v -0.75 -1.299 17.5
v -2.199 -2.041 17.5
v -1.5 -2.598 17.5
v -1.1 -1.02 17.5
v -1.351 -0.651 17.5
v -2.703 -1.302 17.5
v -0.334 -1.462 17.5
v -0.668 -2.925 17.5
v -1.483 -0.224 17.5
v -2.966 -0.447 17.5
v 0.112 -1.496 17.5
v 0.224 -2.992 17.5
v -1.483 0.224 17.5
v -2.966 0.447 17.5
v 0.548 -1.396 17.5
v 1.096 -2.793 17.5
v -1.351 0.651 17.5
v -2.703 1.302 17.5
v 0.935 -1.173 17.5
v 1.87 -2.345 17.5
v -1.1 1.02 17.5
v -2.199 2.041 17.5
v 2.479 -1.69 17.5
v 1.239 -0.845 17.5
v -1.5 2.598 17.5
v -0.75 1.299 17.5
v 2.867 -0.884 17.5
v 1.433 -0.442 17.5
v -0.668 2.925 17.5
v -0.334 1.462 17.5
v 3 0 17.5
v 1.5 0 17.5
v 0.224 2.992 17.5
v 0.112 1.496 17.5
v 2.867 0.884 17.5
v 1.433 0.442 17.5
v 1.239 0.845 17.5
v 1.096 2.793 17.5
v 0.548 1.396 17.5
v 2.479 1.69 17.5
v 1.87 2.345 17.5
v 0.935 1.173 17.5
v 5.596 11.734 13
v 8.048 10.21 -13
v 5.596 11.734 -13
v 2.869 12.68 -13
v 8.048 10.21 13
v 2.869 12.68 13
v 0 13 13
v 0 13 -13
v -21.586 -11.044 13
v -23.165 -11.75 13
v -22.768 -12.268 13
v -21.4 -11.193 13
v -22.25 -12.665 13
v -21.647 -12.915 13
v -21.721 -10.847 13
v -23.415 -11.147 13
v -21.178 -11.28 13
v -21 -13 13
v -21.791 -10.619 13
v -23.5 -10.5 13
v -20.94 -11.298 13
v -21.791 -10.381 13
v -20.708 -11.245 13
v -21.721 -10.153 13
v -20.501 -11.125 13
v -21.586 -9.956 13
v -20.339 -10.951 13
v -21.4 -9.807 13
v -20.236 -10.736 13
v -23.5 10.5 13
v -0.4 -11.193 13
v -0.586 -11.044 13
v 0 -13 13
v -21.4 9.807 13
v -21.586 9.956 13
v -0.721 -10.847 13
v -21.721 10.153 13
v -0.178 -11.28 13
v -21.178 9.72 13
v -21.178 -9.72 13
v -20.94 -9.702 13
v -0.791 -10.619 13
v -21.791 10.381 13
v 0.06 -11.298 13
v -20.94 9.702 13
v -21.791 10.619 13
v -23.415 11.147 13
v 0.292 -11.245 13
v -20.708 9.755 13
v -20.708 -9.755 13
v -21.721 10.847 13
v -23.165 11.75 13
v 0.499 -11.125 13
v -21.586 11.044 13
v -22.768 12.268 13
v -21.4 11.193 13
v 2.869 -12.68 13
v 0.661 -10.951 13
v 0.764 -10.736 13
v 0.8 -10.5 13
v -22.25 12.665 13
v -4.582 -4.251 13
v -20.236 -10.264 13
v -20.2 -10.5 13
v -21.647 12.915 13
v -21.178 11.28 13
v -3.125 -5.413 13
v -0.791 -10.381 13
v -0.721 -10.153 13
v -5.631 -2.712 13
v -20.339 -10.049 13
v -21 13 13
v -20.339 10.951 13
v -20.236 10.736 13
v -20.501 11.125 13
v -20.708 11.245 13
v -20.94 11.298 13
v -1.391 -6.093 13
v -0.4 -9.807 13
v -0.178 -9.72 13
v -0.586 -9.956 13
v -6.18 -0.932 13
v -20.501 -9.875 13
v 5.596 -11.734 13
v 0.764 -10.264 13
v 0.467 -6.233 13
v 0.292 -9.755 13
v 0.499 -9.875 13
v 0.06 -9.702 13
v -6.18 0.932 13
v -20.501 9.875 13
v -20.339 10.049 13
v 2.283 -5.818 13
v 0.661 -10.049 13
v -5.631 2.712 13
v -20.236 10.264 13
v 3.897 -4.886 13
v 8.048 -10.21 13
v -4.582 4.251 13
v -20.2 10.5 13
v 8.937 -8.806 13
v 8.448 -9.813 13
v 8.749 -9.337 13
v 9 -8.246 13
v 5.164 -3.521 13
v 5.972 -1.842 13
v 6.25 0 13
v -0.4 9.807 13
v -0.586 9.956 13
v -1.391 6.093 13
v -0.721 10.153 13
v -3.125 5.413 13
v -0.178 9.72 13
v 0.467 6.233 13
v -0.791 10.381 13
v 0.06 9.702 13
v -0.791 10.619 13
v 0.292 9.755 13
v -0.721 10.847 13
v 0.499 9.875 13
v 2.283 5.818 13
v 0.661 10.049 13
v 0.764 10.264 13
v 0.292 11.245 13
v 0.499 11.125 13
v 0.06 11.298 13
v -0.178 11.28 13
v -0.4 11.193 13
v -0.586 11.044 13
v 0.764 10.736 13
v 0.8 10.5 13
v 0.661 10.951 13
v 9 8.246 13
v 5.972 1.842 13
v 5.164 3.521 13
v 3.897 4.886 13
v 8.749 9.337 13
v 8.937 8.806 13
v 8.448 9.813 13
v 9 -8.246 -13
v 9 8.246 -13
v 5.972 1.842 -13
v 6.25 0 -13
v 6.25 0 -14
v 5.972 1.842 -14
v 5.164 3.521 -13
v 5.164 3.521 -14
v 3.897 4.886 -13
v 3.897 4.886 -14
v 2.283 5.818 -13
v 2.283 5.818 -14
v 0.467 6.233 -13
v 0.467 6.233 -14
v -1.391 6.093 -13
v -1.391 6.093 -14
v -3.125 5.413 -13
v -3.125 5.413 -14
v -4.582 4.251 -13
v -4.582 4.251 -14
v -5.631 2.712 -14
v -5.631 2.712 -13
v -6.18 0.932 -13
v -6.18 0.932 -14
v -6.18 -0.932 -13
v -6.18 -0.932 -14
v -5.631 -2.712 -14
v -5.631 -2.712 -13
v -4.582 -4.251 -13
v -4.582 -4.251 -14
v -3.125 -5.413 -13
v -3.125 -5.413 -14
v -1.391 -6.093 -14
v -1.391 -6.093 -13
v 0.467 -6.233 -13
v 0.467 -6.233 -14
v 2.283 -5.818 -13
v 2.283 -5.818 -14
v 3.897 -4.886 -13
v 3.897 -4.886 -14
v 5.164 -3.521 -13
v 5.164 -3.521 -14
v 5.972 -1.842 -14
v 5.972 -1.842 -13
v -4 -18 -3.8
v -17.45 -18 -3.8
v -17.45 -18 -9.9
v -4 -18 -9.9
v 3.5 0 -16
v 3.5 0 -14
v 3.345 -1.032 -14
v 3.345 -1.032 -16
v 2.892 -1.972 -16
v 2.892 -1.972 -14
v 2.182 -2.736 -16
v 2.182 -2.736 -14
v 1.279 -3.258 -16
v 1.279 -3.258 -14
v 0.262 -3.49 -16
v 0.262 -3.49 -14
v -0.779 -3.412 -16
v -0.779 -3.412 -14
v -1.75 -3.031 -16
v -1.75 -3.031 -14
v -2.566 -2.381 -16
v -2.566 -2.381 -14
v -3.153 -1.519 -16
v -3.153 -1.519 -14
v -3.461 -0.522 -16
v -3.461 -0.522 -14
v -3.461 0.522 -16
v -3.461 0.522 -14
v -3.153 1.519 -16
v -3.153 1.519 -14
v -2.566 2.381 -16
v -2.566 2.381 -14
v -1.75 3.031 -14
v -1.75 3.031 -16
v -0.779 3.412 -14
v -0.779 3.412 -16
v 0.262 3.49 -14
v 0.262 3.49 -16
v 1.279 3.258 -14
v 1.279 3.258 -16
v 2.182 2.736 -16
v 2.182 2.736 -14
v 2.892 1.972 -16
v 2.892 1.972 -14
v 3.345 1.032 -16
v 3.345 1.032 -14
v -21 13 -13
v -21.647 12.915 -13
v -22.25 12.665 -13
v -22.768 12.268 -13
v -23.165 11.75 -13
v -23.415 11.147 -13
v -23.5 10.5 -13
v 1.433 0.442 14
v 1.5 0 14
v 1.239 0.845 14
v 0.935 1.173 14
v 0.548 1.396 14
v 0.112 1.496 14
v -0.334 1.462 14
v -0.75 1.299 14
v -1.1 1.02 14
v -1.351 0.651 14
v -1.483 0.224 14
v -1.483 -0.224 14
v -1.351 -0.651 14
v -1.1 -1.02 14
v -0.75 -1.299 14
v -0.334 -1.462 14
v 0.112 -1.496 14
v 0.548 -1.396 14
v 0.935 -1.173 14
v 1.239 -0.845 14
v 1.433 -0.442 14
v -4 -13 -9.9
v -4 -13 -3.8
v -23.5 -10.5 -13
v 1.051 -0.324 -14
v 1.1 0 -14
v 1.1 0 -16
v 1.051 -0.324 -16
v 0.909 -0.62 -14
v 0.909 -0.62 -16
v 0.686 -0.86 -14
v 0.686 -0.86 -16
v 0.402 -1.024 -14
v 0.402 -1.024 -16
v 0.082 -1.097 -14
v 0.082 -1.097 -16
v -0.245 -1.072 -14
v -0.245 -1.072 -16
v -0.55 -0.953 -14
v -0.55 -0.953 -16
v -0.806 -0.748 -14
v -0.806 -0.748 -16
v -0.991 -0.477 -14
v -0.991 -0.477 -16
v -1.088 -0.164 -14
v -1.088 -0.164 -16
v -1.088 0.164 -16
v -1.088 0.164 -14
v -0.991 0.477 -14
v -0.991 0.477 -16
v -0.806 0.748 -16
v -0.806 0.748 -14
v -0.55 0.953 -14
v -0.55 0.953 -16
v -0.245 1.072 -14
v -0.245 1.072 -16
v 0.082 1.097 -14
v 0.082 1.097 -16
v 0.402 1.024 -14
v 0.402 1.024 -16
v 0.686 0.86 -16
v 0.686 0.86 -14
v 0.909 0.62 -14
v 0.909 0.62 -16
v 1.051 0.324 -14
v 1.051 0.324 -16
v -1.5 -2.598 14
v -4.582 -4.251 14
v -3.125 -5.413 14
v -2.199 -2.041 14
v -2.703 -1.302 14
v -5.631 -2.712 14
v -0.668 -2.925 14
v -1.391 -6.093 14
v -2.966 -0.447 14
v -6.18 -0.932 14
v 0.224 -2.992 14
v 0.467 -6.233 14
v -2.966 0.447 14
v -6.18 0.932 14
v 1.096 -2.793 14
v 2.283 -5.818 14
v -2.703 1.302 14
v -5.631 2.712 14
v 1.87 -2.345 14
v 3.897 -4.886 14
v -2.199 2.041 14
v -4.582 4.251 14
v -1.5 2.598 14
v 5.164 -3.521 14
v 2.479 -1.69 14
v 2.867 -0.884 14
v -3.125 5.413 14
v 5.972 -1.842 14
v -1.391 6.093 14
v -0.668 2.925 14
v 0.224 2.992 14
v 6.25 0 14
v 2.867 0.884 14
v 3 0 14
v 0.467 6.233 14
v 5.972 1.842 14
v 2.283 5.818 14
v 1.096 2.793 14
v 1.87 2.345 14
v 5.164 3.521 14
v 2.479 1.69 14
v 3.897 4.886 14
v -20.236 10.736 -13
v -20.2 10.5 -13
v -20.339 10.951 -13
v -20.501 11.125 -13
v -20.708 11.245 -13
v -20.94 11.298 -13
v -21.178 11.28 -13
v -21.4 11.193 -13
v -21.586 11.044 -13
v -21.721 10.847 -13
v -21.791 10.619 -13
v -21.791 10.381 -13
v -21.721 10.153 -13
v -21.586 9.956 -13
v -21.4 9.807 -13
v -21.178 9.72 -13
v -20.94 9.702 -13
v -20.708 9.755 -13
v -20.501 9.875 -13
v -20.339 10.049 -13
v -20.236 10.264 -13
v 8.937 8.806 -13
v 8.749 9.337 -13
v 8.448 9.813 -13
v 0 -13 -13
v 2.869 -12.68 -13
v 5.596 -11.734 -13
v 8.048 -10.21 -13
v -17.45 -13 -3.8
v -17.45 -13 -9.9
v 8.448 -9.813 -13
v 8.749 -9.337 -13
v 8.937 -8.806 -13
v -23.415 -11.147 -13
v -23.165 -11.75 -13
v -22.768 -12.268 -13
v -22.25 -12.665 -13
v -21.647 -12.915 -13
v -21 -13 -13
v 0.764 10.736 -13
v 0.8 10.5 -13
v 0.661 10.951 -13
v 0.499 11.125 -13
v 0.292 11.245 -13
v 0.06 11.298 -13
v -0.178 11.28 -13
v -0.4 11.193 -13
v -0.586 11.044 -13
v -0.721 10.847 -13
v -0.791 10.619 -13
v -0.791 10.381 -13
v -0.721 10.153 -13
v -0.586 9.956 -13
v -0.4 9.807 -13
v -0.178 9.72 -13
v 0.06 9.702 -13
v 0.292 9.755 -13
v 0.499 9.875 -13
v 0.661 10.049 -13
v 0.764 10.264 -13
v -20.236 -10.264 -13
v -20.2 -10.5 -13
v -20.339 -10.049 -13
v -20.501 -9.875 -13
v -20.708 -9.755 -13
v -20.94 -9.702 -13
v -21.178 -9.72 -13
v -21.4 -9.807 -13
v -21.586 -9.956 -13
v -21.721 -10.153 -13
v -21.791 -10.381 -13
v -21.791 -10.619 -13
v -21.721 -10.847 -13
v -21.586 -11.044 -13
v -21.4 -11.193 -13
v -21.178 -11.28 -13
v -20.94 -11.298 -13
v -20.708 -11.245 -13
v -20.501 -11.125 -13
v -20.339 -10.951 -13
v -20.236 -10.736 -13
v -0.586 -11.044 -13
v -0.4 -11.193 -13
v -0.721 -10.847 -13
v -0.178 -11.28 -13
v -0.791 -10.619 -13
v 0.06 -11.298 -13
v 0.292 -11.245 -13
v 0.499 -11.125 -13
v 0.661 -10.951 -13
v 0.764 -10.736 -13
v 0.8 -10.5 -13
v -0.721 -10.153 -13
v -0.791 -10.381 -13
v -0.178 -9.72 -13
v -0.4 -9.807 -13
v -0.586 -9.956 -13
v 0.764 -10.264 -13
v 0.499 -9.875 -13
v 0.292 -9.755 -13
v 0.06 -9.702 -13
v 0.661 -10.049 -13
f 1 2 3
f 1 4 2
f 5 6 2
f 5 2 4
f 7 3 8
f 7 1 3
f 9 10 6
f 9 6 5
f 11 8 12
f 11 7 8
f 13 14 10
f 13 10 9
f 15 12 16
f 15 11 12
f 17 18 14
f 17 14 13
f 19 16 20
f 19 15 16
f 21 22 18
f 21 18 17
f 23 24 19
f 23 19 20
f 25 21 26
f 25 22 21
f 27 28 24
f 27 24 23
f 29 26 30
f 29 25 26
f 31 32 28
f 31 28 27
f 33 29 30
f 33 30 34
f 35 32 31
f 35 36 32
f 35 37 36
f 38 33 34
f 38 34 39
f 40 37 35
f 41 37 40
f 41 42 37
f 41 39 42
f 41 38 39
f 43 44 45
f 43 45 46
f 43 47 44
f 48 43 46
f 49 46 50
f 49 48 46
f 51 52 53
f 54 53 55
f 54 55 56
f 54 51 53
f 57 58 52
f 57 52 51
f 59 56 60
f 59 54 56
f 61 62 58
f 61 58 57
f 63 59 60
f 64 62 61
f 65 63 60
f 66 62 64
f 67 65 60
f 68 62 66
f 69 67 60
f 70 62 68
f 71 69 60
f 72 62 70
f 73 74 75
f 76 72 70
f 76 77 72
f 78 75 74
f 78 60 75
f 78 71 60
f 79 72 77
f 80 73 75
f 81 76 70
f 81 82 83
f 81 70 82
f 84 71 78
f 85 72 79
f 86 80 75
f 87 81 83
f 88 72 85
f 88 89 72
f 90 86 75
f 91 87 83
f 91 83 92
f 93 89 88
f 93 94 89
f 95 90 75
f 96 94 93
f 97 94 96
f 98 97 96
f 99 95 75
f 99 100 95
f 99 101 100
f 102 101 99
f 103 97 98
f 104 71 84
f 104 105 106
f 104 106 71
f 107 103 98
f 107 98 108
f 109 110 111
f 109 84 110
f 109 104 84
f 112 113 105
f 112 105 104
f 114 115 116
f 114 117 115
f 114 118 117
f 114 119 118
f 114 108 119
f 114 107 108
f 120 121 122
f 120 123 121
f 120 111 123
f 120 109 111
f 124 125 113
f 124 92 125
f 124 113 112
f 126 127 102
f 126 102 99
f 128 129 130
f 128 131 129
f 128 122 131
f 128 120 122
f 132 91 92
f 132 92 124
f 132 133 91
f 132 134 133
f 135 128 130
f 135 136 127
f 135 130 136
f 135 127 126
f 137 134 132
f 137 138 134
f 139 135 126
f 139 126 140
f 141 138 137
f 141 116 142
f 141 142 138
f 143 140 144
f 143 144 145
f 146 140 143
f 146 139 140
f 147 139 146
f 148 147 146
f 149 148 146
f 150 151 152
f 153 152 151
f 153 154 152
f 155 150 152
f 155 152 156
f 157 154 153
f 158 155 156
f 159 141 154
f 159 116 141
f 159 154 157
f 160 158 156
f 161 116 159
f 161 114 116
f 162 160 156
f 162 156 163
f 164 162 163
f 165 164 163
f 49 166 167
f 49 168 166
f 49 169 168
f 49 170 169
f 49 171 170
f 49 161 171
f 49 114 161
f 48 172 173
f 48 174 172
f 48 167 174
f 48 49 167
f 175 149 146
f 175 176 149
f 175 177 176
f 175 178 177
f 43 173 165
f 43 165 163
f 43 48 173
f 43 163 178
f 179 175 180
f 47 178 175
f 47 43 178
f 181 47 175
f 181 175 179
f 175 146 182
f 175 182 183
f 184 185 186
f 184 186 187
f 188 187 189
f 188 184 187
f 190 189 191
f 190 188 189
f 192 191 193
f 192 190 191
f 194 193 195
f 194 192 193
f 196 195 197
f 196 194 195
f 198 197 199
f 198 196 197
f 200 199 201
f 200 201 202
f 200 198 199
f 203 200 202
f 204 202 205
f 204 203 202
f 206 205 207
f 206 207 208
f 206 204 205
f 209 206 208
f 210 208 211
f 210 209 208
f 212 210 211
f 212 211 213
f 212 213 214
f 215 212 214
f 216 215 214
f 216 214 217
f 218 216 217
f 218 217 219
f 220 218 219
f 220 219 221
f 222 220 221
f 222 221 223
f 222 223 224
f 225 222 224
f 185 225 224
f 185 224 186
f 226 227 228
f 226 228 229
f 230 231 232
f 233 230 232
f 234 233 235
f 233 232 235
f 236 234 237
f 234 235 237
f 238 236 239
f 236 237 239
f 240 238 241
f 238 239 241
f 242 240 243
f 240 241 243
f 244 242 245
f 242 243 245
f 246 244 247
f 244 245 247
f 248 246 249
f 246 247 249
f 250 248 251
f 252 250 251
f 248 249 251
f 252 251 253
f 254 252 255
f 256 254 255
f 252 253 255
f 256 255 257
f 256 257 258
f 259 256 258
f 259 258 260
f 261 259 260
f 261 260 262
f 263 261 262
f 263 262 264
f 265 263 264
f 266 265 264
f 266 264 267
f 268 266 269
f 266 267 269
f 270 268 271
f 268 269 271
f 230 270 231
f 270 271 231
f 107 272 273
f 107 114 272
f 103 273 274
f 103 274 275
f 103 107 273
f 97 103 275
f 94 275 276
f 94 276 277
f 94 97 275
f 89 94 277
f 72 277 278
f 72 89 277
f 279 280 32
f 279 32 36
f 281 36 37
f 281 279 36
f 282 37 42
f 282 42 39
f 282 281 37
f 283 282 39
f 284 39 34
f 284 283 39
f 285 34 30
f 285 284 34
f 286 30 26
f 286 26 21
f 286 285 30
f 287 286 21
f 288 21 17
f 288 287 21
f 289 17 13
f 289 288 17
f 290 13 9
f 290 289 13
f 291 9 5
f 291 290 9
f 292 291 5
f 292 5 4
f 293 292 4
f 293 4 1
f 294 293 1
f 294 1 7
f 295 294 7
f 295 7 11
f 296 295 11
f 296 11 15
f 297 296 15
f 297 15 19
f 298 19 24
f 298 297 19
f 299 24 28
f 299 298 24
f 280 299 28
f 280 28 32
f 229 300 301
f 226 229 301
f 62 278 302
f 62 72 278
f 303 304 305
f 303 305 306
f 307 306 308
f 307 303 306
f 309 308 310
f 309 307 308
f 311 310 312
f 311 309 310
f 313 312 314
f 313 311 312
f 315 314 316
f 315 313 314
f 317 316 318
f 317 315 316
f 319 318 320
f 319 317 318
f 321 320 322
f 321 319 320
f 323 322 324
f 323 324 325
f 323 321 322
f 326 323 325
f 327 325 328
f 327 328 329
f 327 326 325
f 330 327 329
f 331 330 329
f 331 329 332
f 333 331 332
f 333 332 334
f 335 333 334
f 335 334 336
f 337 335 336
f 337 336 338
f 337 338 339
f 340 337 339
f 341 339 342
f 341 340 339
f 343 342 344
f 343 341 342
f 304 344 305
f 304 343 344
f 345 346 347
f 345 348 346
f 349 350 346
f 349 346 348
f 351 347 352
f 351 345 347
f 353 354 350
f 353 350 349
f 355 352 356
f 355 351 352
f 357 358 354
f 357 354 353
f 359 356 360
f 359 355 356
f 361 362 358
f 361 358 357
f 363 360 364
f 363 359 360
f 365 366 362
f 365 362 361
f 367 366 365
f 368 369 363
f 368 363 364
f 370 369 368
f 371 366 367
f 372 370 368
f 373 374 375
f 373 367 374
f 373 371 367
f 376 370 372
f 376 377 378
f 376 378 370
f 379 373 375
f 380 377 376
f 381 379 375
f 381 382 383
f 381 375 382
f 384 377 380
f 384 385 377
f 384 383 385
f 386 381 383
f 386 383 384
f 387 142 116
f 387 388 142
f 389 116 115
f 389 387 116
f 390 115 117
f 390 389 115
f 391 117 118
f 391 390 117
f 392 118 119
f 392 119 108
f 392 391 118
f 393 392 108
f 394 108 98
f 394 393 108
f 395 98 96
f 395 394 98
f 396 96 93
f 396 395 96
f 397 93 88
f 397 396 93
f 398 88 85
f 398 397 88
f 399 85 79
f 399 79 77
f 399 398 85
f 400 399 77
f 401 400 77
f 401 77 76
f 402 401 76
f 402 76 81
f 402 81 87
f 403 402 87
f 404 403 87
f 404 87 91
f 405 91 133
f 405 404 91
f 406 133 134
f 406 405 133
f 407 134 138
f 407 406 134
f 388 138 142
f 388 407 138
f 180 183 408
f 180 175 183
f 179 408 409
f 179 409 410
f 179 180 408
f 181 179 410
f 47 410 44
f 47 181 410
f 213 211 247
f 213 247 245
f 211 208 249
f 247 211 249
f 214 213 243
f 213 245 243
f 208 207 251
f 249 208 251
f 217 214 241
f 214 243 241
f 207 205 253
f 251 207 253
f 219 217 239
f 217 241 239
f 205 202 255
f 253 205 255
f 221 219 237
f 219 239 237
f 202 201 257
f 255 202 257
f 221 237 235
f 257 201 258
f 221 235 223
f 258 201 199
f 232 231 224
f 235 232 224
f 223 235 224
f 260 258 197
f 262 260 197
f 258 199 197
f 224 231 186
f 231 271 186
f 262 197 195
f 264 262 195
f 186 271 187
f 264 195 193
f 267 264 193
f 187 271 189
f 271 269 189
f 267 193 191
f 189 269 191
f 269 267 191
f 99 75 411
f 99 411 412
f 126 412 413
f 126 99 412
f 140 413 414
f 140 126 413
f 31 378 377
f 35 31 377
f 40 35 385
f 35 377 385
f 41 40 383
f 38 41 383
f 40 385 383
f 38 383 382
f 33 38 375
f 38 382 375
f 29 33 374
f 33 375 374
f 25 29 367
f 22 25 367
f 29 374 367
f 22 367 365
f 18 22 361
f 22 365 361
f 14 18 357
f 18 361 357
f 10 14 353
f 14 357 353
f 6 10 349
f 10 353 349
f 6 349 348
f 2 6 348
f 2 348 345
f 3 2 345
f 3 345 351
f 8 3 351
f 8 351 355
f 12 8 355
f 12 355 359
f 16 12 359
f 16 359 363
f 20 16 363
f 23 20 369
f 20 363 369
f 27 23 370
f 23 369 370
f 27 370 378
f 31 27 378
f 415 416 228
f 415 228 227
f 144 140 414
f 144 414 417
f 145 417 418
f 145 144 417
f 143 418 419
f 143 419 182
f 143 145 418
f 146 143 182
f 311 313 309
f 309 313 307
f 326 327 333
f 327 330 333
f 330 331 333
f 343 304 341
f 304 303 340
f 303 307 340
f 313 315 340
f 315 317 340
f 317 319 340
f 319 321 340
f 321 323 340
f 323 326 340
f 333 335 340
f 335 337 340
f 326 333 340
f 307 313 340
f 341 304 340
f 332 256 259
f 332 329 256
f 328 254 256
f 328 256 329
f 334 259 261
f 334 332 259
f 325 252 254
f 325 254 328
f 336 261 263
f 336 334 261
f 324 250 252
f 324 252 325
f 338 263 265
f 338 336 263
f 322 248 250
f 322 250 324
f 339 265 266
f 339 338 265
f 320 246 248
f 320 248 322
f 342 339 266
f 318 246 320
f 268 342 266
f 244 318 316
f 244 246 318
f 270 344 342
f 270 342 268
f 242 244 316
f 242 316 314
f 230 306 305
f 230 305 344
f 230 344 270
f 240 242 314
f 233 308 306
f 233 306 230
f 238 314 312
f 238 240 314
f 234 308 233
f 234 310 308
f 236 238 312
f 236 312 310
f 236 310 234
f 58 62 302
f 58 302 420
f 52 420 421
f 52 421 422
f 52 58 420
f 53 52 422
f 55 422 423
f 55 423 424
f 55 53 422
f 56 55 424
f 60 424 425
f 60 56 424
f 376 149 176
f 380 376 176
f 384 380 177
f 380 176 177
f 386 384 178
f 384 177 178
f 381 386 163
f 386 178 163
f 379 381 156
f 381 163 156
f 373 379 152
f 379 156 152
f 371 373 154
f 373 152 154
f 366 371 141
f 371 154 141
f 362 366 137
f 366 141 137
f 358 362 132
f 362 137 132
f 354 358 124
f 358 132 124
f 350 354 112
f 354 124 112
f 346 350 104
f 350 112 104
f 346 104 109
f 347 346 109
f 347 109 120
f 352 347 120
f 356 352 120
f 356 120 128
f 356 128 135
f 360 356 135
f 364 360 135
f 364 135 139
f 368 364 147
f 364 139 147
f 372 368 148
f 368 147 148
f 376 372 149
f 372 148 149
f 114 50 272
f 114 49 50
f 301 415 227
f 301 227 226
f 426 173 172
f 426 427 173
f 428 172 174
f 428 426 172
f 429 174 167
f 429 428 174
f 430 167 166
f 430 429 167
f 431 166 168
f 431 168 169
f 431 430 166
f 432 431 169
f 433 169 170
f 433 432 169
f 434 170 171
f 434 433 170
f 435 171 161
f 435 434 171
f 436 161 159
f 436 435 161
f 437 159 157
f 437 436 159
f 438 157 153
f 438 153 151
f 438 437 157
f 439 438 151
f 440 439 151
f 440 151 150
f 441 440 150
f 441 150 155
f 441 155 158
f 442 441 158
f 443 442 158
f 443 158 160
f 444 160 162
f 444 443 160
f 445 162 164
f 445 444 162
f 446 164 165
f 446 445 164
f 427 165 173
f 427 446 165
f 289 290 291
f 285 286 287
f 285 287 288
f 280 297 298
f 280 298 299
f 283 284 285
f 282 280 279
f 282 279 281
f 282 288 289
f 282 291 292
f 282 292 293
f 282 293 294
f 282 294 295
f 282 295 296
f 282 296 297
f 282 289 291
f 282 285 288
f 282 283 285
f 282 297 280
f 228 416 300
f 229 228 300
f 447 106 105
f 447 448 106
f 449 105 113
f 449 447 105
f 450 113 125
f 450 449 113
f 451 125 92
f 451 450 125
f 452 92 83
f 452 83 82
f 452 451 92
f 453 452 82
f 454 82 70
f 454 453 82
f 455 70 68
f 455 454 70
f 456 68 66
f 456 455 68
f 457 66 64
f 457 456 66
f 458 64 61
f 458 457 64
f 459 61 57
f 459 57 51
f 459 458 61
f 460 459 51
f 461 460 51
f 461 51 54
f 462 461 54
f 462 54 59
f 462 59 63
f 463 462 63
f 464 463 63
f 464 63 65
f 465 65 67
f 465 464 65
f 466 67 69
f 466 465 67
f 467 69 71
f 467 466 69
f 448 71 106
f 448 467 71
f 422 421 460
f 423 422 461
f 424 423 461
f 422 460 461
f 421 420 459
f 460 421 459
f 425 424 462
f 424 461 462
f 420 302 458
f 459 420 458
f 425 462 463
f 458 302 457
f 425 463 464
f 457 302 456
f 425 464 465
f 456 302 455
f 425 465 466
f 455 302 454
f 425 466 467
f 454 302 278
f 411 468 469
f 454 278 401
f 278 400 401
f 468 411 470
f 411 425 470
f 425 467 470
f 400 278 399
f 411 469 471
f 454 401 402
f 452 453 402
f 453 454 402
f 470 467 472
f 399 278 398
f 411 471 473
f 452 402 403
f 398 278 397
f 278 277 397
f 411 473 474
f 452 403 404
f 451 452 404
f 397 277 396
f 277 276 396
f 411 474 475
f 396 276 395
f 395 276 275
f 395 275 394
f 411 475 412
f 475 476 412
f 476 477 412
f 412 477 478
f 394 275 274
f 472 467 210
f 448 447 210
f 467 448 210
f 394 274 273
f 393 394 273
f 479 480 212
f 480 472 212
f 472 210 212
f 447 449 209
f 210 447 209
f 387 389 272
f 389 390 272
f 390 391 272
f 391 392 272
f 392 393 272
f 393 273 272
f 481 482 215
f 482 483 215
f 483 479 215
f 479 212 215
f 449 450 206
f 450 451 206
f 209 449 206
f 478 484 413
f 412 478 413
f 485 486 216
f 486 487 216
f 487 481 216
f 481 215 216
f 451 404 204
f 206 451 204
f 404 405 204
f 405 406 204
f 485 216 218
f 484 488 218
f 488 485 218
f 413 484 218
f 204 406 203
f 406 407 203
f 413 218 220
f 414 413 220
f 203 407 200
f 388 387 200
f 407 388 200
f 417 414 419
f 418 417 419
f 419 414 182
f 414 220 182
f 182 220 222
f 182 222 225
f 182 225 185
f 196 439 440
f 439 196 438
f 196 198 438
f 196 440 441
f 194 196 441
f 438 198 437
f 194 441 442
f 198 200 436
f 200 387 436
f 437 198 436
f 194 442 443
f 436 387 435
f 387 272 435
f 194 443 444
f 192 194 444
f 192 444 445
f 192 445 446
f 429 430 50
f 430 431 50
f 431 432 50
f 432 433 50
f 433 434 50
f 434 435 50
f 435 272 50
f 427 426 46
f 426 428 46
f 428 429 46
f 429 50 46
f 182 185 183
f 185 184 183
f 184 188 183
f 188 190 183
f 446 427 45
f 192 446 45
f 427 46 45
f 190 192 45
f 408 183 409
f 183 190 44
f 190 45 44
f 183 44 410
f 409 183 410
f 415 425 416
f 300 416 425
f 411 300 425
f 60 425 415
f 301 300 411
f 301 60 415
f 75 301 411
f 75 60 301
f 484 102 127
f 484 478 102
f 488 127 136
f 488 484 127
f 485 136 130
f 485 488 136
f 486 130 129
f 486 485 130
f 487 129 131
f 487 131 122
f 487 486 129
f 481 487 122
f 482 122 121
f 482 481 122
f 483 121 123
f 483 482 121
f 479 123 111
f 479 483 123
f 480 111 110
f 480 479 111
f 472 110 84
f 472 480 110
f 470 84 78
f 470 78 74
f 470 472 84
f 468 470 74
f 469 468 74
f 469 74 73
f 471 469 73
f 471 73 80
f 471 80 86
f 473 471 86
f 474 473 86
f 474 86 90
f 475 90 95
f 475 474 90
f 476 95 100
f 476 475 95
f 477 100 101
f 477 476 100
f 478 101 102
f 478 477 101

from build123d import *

# Parameters (mm, degrees)
F0_R          = 0.8
F1_DEPTH      = 13
F2_R          = 6.25
F3_DEPTH      = 1
F3_DEPTH_BACK = 27
F4_R          = 3
F4_R_2        = 1.5
F5_DEPTH      = 3.5
F6_R          = 3.5
F6_R_2        = 1.1
F7_DEPTH      = 2
F8_W          = 13.45
F8_H          = 6.1
F9_DEPTH      = 5


with BuildPart() as f1:
    # F0 (on Top) → F1 (new body, symmetric)
    with BuildSketch(Plane.XY):
        with BuildLine():
            Line((-23.5, 10.5), (-23.5, 0))
            Line((-23.5, 0), (-23.5, -10.5))
            ThreePointArc((-23.5, -10.5), (-22.767767, -12.267767), (-21, -13))
            Line((-21, -13), (0, -13))
            ThreePointArc((0, -13), (4.25883, -12.282604), (8.047619, -10.209595))
            ThreePointArc((8.047619, -10.209595), (8.749339, -9.337301), (9, -8.246211))
            Line((9, -8.246211), (9, 0))
            Line((9, 0), (9, 8.246211))
            ThreePointArc((9, 8.246211), (8.749339, 9.337301), (8.047619, 10.209595))
            ThreePointArc((8.047619, 10.209595), (4.25883, 12.282604), (0, 13))
            Line((0, 13), (-21, 13))
            ThreePointArc((-21, 13), (-22.767767, 12.267767), (-23.5, 10.5))
        make_face()
        with Locations((-21, -10.5)):
            Circle(F0_R, mode=Mode.SUBTRACT)
        with Locations((0, -10.5)):
            Circle(F0_R, mode=Mode.SUBTRACT)
        with Locations((-21, 10.5)):
            Circle(F0_R, mode=Mode.SUBTRACT)
        with Locations((0, 10.5)):
            Circle(F0_R, mode=Mode.SUBTRACT)
    extrude(amount=F1_DEPTH, both=True)

    # F2 (on face) → F3 (join, two sides)
    with BuildSketch(Plane.XY.offset(13)) as f3_sk:
        Circle(F2_R)
    extrude(amount=F3_DEPTH)
    extrude(f3_sk.sketch, amount=-F3_DEPTH_BACK)

    # F4 (on face) → F5 (join)
    with BuildSketch(Plane.XY.offset(14)):
        Circle(F4_R)
        Circle(F4_R_2, mode=Mode.SUBTRACT)
    extrude(amount=F5_DEPTH)

    # F6 (on face) → F7 (join)
    with BuildSketch(Plane(origin=(0, 0, -14), x_dir=(1, 0, 0), z_dir=(0, 0, -1))):
        Circle(F6_R)
        Circle(F6_R_2, mode=Mode.SUBTRACT)
    extrude(amount=F7_DEPTH)

    # F8 (on face) → F9 (join)
    with BuildSketch(Plane.XZ.offset(13)):
        with Locations((-10.725, -6.85)):
            Rectangle(F8_W, F8_H)
    extrude(amount=F9_DEPTH)


solid = f1.part
